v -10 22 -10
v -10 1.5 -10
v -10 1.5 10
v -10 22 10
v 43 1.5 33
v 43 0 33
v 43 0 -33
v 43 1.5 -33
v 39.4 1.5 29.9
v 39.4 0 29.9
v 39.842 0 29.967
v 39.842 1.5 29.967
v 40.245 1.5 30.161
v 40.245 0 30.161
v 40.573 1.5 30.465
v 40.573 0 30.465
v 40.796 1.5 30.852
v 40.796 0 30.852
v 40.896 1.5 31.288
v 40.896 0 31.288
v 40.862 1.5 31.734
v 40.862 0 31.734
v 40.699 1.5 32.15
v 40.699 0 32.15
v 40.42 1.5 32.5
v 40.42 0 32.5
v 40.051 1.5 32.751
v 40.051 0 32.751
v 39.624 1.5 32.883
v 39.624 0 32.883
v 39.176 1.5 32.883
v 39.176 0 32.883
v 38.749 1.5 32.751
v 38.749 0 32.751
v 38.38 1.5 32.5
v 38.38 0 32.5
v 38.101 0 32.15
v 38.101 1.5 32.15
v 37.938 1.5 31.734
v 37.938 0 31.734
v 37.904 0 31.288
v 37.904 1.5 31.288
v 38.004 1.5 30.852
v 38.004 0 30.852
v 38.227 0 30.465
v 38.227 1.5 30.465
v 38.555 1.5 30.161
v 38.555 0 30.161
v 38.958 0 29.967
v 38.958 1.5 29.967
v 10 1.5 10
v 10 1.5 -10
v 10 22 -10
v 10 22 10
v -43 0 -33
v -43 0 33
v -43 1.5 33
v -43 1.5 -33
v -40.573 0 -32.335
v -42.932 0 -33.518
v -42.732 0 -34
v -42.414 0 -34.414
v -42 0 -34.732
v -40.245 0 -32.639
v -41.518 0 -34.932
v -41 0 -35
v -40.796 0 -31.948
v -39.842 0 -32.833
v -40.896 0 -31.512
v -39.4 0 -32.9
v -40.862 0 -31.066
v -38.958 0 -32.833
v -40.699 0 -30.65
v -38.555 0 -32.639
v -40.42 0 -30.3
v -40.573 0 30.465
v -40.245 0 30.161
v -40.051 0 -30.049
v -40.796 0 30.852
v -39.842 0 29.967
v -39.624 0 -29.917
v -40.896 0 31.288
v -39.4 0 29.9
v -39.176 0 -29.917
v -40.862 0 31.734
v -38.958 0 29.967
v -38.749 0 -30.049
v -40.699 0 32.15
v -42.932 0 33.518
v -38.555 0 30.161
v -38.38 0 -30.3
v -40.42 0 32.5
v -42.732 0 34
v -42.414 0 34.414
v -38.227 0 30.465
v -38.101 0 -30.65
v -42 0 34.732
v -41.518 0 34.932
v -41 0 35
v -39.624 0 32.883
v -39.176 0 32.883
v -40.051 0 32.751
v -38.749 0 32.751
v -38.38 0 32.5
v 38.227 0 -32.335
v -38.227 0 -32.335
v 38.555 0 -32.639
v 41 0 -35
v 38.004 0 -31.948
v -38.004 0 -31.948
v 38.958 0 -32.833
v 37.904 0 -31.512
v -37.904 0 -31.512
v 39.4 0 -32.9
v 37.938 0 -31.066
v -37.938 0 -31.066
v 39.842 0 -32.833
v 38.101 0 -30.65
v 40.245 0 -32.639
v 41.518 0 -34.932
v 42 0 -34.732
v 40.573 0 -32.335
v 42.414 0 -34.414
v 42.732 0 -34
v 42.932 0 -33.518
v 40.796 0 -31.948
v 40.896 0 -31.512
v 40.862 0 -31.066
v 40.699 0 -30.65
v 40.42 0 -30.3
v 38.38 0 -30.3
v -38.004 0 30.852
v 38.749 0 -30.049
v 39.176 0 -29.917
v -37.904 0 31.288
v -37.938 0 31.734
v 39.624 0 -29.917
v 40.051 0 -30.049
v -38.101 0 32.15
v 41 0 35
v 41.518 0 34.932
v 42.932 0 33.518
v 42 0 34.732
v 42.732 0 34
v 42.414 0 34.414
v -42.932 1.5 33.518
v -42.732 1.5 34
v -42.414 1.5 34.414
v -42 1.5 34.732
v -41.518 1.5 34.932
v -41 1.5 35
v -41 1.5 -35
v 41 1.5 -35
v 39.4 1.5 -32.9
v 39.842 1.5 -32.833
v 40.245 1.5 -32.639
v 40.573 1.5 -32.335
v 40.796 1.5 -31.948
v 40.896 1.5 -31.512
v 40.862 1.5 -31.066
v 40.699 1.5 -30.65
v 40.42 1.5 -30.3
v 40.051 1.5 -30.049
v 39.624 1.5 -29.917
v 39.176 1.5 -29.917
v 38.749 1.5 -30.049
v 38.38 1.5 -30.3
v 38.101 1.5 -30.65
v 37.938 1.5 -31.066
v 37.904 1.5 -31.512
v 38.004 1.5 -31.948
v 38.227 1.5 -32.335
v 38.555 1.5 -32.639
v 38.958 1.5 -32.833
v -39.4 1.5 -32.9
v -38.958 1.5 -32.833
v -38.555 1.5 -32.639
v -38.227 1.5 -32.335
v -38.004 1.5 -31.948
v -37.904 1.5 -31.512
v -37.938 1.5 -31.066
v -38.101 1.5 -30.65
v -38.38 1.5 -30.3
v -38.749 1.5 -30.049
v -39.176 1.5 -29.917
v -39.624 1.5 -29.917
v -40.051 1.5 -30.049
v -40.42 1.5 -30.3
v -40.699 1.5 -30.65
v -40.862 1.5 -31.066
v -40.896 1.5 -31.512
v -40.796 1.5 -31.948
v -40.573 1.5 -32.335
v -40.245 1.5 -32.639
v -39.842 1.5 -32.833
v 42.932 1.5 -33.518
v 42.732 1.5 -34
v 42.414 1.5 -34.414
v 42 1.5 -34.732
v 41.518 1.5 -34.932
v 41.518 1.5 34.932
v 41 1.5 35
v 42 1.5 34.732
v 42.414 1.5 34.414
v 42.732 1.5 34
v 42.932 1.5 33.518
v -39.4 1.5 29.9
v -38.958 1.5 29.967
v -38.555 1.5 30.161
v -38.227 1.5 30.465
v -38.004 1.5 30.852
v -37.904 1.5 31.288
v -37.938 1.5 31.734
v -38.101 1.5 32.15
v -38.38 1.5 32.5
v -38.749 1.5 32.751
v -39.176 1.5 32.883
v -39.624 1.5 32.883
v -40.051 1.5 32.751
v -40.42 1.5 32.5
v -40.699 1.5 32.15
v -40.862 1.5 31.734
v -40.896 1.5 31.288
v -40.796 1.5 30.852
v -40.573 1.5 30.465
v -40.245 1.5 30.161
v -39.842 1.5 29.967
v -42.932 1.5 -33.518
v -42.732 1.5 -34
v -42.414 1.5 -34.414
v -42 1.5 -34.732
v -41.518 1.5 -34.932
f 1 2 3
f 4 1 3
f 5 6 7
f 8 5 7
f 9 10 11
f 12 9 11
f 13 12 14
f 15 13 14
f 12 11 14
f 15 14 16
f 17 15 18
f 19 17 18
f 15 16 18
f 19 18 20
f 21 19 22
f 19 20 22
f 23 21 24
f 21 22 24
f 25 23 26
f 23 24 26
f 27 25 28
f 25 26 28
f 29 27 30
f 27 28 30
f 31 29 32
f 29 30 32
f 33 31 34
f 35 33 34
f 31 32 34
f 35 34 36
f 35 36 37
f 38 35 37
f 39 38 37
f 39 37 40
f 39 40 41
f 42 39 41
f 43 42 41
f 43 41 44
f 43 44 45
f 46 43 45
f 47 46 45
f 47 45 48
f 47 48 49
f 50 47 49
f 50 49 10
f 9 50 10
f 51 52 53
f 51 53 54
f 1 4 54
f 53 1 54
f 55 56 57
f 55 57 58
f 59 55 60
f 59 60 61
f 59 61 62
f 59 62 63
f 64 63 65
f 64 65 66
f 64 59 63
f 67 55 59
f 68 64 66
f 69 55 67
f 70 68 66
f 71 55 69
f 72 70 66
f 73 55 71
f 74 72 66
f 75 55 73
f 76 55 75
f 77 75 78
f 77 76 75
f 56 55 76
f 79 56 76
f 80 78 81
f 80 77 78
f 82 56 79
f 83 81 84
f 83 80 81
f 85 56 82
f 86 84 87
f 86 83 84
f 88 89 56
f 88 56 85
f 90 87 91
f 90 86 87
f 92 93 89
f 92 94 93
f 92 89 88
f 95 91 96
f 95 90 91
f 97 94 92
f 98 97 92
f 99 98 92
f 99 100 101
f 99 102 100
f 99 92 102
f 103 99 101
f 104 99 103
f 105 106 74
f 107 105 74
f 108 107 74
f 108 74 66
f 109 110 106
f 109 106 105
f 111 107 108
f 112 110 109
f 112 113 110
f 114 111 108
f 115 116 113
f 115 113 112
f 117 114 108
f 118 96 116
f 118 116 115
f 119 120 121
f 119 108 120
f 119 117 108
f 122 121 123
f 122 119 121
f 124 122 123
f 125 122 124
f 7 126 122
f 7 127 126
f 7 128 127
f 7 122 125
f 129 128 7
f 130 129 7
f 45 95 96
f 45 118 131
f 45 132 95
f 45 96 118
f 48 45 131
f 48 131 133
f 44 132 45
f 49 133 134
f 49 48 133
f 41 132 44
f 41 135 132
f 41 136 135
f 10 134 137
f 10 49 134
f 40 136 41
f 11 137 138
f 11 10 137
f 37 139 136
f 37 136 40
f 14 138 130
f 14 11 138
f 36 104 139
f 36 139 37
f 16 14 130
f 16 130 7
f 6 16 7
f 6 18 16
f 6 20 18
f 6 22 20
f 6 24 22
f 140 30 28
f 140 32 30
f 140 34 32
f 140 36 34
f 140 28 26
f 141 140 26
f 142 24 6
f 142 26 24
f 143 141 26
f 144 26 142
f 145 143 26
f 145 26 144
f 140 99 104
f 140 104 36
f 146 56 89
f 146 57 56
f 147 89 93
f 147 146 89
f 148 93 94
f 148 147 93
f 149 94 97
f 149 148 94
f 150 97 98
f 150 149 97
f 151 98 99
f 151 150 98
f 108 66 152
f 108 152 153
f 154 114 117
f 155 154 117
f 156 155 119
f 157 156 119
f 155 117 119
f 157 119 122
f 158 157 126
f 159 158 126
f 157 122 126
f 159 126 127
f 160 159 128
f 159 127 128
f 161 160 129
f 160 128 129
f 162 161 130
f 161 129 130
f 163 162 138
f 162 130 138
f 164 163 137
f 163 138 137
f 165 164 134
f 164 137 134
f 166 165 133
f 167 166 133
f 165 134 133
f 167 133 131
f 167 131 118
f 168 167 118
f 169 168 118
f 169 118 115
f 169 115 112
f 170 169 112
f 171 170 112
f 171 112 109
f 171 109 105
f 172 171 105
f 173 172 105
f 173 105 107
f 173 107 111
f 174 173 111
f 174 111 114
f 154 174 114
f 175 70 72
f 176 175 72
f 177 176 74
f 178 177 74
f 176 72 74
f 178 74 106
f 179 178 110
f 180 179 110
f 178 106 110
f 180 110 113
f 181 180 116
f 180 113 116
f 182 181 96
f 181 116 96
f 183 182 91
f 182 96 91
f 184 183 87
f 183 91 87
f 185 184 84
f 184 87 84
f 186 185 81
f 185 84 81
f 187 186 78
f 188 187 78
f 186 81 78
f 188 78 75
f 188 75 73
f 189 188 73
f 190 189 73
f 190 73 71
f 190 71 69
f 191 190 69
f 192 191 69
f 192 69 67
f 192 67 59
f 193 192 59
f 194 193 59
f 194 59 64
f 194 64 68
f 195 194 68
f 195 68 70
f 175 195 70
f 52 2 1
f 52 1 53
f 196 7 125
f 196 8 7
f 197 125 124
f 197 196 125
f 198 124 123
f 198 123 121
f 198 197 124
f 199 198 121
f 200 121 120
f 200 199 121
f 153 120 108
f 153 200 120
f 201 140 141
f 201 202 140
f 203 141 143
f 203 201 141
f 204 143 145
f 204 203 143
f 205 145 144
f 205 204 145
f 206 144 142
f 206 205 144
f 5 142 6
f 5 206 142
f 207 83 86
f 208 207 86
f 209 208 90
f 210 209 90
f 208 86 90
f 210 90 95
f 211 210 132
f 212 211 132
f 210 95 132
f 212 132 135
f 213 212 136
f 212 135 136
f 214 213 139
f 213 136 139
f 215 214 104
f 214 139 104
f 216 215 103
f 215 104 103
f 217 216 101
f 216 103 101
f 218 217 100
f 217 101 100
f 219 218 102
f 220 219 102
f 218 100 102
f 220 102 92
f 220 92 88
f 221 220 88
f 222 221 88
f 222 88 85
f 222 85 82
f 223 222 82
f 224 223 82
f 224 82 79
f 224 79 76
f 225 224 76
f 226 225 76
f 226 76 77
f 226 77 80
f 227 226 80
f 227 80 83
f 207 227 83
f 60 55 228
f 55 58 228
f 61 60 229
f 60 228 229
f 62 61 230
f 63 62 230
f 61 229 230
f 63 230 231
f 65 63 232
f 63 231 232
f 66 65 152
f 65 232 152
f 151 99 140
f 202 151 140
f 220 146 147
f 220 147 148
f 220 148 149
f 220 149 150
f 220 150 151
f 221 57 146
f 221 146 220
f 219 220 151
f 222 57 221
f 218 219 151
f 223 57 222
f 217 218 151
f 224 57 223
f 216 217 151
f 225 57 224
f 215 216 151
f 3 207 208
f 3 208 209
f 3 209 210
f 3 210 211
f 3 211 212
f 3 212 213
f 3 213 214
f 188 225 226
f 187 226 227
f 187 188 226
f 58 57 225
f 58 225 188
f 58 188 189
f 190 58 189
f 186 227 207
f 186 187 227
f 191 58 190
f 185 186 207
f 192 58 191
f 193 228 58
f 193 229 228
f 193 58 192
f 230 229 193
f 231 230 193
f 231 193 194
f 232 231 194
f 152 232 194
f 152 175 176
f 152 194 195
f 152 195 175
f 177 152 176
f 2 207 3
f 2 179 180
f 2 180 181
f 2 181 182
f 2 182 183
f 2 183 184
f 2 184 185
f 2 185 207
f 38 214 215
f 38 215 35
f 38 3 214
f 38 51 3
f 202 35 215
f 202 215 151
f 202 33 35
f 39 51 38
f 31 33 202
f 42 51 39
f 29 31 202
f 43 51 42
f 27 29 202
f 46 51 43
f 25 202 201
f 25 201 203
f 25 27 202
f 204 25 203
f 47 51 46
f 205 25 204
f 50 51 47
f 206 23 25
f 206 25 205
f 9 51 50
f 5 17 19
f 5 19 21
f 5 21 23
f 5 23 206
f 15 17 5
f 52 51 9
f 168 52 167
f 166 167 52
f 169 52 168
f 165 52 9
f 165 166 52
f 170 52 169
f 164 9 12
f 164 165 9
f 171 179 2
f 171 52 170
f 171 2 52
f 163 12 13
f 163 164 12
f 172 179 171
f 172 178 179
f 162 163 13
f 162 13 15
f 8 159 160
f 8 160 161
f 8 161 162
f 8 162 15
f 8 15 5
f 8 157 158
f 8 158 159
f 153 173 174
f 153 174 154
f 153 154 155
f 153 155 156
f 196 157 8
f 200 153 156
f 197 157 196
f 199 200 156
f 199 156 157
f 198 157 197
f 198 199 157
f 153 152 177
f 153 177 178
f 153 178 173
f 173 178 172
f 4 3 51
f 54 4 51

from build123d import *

# Parameters (mm, degrees)
SKETCH1_W             = 86
SKETCH1_H             = 70
BOSS_EXTRUDE1_DEPTH   = 1.5
FILLET1_R             = 2
SKETCH2_W             = 20
SKETCH2_H             = 20
BOSS_EXTRUDE2_DEPTH   = 22
F_1_0MM_DOWEL_HOLE1_D = 3


with BuildPart() as part:
    # Sketch1 → Boss-Extrude1 (new body)
    with BuildSketch(Plane(origin=(0, 0, 0), x_dir=(1, 0, 0), z_dir=(0, 1, 0))):
        Rectangle(SKETCH1_W, SKETCH1_H)
    extrude(amount=BOSS_EXTRUDE1_DEPTH)

    # Fillet1
    fillet1_edges = [part.edges().sort_by_distance(p)[0] for p in [
        (43, 0.75, 35),
        (-43, 0.75, 35),
        (-43, 0.75, -35),
        (43, 0.75, -35),
    ]]
    fillet(fillet1_edges, radius=FILLET1_R)

    # Sketch2 → Boss-Extrude2 (add)
    with BuildSketch(Plane.XZ):
        Rectangle(SKETCH2_W, SKETCH2_H)
    extrude(amount=-BOSS_EXTRUDE2_DEPTH)

    # Ø1.0mm Dowel Hole1 (through all)
    with Locations(Plane(origin=(-39.4, 1.5, -31.4), x_dir=(0, 0, 1), z_dir=(0, 1, 0))):
        with Locations((0, 0), (0, 78.8), (62.8, 0), (62.8, 78.8)):
            Hole(F_1_0MM_DOWEL_HOLE1_D / 2)


solid = part.part
